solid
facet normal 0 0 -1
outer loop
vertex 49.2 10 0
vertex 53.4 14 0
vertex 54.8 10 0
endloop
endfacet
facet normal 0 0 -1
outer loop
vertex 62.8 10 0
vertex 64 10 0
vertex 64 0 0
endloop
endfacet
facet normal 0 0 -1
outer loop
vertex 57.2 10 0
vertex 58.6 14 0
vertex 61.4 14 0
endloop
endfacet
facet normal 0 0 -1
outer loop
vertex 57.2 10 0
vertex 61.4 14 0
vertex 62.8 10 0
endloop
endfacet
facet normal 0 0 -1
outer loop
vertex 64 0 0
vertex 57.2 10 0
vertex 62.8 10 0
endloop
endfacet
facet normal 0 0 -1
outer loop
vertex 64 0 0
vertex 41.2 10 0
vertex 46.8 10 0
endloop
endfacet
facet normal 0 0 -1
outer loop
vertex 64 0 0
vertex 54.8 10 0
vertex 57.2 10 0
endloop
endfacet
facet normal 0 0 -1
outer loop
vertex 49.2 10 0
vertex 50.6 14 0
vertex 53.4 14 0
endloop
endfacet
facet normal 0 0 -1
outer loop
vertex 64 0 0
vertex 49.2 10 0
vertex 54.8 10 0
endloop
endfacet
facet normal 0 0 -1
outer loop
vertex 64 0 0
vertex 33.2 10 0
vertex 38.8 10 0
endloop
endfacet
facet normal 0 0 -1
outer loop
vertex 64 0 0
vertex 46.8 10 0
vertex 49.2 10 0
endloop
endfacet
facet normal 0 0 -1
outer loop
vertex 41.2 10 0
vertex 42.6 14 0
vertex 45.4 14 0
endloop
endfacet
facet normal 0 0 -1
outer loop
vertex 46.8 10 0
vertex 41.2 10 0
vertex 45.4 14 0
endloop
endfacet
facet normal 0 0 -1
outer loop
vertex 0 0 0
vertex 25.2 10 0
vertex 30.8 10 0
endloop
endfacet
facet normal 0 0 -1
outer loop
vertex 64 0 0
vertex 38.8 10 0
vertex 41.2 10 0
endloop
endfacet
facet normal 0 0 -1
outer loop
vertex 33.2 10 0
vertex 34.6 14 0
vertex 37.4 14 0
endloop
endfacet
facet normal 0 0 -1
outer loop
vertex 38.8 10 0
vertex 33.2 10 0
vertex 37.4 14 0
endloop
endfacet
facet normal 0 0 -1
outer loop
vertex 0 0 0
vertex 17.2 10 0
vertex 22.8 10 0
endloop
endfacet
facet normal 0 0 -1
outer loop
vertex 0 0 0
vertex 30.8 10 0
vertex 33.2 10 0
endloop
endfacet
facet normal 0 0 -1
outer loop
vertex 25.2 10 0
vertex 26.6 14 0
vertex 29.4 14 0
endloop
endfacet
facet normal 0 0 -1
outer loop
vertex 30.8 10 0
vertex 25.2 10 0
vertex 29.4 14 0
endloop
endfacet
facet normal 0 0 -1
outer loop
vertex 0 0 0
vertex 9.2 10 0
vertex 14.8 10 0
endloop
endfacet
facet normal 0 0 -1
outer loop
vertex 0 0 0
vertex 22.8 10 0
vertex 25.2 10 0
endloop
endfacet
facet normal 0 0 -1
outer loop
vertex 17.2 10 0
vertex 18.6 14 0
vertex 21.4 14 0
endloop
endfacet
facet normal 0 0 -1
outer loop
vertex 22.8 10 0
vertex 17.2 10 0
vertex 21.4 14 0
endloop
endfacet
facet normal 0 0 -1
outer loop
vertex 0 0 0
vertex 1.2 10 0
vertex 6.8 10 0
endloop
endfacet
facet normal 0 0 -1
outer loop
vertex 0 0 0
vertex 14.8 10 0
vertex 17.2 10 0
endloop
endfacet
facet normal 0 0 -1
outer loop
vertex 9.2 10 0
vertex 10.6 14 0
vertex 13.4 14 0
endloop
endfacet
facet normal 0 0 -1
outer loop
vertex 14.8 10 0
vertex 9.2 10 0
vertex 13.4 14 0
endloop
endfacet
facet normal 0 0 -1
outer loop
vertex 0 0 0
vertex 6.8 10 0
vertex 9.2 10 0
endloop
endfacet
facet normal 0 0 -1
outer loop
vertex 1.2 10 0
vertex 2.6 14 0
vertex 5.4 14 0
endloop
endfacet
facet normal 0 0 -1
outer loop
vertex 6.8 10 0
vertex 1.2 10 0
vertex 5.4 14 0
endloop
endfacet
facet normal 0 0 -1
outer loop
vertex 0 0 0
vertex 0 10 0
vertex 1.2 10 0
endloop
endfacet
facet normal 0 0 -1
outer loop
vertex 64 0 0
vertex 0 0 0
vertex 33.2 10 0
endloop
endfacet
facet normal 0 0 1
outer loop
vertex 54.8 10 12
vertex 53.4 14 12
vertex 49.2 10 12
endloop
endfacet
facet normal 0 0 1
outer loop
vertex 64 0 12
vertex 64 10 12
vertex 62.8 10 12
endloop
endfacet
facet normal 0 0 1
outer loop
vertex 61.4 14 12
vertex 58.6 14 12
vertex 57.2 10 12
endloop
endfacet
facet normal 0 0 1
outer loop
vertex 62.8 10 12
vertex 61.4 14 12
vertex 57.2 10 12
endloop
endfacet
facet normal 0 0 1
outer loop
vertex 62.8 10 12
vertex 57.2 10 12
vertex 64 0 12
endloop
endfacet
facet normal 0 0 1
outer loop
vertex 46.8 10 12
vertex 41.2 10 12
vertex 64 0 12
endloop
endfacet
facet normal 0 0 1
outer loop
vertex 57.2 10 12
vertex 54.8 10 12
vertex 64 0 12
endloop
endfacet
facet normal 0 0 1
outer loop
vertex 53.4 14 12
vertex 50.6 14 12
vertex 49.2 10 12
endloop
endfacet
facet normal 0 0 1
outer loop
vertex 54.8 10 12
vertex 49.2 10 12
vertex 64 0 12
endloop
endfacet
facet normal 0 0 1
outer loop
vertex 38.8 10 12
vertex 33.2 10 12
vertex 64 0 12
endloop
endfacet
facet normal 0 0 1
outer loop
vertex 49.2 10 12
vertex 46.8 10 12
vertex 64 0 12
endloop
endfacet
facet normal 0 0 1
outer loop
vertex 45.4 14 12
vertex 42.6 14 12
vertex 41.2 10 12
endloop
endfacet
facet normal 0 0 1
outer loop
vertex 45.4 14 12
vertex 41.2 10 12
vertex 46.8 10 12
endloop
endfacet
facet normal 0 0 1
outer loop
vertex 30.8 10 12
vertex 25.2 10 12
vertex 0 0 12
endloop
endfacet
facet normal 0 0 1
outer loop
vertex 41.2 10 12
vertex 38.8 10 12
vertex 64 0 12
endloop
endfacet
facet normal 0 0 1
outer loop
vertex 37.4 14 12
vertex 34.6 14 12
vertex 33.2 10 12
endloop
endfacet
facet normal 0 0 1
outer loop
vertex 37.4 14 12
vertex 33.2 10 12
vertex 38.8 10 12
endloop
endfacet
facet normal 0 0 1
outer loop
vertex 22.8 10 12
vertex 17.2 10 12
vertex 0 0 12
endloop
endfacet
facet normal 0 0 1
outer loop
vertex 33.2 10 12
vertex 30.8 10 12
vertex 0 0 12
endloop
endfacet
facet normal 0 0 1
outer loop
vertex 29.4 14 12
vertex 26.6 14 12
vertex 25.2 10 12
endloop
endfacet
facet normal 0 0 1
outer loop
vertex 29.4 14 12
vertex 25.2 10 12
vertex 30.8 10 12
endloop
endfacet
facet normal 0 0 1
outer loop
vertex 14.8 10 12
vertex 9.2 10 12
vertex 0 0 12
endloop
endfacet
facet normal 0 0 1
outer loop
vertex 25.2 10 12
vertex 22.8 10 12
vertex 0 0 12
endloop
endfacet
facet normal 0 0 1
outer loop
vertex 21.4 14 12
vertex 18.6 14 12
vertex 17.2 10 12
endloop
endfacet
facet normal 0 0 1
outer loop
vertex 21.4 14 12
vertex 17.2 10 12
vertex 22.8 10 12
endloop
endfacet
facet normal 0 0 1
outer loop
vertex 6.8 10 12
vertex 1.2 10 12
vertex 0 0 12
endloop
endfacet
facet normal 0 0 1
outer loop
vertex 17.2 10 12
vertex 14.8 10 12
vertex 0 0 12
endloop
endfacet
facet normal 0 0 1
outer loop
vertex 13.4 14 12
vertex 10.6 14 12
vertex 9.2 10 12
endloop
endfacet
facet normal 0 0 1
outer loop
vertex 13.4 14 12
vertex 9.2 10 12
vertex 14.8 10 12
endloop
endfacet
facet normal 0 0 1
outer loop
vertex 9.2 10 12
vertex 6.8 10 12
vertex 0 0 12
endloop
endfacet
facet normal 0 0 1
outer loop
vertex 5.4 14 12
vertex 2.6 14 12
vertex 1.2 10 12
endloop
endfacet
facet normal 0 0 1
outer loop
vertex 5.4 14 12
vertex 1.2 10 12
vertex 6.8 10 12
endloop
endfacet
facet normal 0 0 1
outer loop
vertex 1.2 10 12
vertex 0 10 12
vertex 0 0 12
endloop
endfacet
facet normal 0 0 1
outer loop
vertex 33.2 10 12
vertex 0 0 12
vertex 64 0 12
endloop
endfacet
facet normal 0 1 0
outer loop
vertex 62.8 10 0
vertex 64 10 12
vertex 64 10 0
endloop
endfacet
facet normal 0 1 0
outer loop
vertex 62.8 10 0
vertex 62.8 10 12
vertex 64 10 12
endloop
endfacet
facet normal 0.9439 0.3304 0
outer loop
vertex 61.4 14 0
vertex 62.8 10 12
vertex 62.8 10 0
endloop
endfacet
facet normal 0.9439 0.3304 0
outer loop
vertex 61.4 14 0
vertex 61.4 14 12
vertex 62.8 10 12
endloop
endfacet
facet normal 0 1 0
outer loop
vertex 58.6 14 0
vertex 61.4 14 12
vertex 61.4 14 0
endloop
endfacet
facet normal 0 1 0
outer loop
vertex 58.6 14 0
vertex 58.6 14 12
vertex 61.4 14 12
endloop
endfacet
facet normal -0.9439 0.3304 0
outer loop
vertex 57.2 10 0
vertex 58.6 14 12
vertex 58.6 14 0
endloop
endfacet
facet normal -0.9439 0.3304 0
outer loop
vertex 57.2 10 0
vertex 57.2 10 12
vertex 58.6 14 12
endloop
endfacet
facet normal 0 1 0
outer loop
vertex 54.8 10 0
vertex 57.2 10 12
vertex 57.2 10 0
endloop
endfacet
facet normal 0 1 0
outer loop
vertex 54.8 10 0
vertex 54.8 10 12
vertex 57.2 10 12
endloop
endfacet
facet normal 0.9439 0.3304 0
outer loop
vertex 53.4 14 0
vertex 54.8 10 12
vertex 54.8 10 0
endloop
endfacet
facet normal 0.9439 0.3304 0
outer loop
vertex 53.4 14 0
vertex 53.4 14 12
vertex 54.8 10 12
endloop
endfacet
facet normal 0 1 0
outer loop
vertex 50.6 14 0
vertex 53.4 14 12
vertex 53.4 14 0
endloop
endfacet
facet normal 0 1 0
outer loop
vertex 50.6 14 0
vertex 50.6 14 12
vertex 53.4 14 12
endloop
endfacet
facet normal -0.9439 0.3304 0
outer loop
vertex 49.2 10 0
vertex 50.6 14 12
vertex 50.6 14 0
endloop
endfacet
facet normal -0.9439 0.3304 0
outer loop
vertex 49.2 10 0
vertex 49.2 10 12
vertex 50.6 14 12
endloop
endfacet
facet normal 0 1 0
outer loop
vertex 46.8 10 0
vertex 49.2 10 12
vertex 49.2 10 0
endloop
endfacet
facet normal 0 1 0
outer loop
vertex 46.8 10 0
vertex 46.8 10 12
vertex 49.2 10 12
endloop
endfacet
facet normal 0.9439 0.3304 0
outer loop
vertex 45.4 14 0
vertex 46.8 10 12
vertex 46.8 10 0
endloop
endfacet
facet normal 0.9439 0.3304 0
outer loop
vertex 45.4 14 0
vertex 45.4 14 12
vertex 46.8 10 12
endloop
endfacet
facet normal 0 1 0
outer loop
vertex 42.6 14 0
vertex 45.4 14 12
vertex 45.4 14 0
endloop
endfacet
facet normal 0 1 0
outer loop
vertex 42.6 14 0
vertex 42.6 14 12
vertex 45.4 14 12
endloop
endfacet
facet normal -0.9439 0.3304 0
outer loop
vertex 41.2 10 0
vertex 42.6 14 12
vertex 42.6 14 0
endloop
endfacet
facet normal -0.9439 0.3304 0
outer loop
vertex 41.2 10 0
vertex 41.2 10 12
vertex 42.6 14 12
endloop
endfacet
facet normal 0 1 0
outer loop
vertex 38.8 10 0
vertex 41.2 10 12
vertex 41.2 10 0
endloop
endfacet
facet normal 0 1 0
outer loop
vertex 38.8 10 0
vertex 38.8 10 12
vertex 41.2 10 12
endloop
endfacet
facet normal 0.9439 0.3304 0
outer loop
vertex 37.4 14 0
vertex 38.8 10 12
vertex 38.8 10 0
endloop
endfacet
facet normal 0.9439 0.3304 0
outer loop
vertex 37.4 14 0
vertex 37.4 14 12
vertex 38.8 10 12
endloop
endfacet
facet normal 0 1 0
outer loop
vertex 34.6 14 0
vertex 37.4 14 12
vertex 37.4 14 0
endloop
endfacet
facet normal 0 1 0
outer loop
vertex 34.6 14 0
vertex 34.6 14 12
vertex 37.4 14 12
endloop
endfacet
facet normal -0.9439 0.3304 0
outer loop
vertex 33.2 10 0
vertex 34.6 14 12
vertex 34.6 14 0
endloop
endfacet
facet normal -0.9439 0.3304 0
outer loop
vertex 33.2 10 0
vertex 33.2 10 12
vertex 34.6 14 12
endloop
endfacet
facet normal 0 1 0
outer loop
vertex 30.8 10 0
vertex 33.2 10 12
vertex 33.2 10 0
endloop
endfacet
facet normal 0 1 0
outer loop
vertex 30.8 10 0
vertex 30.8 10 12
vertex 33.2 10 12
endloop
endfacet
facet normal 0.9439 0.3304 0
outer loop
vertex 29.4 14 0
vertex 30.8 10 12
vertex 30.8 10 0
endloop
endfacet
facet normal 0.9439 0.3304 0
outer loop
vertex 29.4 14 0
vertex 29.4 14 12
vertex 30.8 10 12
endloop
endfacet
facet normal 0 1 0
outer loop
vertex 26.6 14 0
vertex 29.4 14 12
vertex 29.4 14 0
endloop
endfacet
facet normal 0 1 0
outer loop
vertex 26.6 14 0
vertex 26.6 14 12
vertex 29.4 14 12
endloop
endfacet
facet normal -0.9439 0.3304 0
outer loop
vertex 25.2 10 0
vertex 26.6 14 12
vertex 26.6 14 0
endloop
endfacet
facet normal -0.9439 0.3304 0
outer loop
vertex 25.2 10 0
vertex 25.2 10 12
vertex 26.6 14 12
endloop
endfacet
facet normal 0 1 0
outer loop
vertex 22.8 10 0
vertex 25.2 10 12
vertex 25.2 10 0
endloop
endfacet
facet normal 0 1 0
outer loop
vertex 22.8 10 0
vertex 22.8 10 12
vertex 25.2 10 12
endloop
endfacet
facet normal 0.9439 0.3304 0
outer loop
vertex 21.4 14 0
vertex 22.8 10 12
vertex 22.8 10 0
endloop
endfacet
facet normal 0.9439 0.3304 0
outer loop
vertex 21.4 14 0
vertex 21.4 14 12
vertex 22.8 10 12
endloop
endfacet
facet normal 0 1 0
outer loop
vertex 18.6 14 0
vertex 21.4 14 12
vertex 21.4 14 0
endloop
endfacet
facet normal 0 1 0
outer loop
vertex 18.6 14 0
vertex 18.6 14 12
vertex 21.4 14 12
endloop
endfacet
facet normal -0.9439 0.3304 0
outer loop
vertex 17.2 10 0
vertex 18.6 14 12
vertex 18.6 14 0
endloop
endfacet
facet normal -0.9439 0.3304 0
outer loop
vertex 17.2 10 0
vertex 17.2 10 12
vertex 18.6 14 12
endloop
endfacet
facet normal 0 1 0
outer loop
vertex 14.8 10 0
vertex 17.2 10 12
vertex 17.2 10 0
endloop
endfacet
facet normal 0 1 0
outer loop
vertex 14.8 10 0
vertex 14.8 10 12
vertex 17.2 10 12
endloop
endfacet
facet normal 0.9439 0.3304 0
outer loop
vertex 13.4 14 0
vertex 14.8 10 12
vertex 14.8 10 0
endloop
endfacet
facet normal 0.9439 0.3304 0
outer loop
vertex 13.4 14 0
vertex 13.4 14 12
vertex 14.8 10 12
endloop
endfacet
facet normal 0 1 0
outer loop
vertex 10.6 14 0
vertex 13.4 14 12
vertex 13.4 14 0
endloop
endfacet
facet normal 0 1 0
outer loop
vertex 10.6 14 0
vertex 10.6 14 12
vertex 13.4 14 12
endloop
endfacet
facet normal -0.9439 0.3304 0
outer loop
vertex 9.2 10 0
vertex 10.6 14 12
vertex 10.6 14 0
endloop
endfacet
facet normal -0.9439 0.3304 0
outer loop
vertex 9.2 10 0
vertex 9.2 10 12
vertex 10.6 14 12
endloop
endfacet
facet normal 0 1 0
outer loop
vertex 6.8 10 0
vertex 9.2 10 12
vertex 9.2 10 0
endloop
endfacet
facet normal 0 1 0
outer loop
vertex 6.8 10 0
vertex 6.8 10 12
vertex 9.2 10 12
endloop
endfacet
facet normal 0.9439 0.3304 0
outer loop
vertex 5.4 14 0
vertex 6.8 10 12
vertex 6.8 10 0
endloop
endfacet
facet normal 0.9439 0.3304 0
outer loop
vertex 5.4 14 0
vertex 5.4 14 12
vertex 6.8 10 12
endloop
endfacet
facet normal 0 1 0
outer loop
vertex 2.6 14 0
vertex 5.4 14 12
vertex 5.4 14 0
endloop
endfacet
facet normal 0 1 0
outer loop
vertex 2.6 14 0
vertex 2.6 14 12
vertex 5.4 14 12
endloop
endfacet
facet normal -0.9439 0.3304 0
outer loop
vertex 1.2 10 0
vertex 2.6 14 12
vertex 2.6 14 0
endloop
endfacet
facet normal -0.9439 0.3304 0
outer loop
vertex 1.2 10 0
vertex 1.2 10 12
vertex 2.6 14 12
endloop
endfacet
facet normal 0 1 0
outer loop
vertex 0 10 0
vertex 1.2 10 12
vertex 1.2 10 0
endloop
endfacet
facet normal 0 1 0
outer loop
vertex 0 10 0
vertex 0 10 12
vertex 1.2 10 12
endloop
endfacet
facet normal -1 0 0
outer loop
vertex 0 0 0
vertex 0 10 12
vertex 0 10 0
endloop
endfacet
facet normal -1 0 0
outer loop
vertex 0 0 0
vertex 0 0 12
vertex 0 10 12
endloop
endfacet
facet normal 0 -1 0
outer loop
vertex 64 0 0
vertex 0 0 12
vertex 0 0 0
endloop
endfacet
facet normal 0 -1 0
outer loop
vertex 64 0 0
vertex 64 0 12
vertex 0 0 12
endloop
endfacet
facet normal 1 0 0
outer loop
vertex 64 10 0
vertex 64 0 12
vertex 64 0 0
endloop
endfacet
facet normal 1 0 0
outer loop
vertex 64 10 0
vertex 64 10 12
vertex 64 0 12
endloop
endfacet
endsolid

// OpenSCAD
$fn = 32;

// ----------------------------------------------------------------------
// Gear rack: 8 teeth, pitch 8 mm
// ----------------------------------------------------------------------

// --- parameters (mm) ---
teeth = 8;                // number of teeth
pitch = 8;                // tooth pitch, X
root_w = 5.6;             // tooth width at the root
tip_w = 2.8;              // tooth width at the tip
base_h = 10;              // rack body height, Y
tooth_h = 4;              // tooth height above the body
plate_t = 12;             // rack width, Z (extrusion height)

rack_l = teeth * pitch;  // overall length
total_h = base_h + tooth_h;  // overall height

profile = [[0, 0], [64, 0], [64, 10], [62.8, 10], [61.4, 14], [58.6, 14], [57.2, 10], [54.8, 10], [53.4, 14], [50.6, 14], [49.2, 10], [46.8, 10], [45.4, 14], [42.6, 14], [41.2, 10], [38.8, 10], [37.4, 14], [34.6, 14], [33.2, 10], [30.8, 10], [29.4, 14], [26.6, 14], [25.2, 10], [22.8, 10], [21.4, 14], [18.6, 14], [17.2, 10], [14.8, 10], [13.4, 14], [10.6, 14], [9.2, 10], [6.8, 10], [5.4, 14], [2.6, 14], [1.2, 10], [0, 10]];  // primary outline, 36 points, counter clockwise

// --- the one profile operation ---
linear_extrude(height = plate_t) polygon(points = profile);
